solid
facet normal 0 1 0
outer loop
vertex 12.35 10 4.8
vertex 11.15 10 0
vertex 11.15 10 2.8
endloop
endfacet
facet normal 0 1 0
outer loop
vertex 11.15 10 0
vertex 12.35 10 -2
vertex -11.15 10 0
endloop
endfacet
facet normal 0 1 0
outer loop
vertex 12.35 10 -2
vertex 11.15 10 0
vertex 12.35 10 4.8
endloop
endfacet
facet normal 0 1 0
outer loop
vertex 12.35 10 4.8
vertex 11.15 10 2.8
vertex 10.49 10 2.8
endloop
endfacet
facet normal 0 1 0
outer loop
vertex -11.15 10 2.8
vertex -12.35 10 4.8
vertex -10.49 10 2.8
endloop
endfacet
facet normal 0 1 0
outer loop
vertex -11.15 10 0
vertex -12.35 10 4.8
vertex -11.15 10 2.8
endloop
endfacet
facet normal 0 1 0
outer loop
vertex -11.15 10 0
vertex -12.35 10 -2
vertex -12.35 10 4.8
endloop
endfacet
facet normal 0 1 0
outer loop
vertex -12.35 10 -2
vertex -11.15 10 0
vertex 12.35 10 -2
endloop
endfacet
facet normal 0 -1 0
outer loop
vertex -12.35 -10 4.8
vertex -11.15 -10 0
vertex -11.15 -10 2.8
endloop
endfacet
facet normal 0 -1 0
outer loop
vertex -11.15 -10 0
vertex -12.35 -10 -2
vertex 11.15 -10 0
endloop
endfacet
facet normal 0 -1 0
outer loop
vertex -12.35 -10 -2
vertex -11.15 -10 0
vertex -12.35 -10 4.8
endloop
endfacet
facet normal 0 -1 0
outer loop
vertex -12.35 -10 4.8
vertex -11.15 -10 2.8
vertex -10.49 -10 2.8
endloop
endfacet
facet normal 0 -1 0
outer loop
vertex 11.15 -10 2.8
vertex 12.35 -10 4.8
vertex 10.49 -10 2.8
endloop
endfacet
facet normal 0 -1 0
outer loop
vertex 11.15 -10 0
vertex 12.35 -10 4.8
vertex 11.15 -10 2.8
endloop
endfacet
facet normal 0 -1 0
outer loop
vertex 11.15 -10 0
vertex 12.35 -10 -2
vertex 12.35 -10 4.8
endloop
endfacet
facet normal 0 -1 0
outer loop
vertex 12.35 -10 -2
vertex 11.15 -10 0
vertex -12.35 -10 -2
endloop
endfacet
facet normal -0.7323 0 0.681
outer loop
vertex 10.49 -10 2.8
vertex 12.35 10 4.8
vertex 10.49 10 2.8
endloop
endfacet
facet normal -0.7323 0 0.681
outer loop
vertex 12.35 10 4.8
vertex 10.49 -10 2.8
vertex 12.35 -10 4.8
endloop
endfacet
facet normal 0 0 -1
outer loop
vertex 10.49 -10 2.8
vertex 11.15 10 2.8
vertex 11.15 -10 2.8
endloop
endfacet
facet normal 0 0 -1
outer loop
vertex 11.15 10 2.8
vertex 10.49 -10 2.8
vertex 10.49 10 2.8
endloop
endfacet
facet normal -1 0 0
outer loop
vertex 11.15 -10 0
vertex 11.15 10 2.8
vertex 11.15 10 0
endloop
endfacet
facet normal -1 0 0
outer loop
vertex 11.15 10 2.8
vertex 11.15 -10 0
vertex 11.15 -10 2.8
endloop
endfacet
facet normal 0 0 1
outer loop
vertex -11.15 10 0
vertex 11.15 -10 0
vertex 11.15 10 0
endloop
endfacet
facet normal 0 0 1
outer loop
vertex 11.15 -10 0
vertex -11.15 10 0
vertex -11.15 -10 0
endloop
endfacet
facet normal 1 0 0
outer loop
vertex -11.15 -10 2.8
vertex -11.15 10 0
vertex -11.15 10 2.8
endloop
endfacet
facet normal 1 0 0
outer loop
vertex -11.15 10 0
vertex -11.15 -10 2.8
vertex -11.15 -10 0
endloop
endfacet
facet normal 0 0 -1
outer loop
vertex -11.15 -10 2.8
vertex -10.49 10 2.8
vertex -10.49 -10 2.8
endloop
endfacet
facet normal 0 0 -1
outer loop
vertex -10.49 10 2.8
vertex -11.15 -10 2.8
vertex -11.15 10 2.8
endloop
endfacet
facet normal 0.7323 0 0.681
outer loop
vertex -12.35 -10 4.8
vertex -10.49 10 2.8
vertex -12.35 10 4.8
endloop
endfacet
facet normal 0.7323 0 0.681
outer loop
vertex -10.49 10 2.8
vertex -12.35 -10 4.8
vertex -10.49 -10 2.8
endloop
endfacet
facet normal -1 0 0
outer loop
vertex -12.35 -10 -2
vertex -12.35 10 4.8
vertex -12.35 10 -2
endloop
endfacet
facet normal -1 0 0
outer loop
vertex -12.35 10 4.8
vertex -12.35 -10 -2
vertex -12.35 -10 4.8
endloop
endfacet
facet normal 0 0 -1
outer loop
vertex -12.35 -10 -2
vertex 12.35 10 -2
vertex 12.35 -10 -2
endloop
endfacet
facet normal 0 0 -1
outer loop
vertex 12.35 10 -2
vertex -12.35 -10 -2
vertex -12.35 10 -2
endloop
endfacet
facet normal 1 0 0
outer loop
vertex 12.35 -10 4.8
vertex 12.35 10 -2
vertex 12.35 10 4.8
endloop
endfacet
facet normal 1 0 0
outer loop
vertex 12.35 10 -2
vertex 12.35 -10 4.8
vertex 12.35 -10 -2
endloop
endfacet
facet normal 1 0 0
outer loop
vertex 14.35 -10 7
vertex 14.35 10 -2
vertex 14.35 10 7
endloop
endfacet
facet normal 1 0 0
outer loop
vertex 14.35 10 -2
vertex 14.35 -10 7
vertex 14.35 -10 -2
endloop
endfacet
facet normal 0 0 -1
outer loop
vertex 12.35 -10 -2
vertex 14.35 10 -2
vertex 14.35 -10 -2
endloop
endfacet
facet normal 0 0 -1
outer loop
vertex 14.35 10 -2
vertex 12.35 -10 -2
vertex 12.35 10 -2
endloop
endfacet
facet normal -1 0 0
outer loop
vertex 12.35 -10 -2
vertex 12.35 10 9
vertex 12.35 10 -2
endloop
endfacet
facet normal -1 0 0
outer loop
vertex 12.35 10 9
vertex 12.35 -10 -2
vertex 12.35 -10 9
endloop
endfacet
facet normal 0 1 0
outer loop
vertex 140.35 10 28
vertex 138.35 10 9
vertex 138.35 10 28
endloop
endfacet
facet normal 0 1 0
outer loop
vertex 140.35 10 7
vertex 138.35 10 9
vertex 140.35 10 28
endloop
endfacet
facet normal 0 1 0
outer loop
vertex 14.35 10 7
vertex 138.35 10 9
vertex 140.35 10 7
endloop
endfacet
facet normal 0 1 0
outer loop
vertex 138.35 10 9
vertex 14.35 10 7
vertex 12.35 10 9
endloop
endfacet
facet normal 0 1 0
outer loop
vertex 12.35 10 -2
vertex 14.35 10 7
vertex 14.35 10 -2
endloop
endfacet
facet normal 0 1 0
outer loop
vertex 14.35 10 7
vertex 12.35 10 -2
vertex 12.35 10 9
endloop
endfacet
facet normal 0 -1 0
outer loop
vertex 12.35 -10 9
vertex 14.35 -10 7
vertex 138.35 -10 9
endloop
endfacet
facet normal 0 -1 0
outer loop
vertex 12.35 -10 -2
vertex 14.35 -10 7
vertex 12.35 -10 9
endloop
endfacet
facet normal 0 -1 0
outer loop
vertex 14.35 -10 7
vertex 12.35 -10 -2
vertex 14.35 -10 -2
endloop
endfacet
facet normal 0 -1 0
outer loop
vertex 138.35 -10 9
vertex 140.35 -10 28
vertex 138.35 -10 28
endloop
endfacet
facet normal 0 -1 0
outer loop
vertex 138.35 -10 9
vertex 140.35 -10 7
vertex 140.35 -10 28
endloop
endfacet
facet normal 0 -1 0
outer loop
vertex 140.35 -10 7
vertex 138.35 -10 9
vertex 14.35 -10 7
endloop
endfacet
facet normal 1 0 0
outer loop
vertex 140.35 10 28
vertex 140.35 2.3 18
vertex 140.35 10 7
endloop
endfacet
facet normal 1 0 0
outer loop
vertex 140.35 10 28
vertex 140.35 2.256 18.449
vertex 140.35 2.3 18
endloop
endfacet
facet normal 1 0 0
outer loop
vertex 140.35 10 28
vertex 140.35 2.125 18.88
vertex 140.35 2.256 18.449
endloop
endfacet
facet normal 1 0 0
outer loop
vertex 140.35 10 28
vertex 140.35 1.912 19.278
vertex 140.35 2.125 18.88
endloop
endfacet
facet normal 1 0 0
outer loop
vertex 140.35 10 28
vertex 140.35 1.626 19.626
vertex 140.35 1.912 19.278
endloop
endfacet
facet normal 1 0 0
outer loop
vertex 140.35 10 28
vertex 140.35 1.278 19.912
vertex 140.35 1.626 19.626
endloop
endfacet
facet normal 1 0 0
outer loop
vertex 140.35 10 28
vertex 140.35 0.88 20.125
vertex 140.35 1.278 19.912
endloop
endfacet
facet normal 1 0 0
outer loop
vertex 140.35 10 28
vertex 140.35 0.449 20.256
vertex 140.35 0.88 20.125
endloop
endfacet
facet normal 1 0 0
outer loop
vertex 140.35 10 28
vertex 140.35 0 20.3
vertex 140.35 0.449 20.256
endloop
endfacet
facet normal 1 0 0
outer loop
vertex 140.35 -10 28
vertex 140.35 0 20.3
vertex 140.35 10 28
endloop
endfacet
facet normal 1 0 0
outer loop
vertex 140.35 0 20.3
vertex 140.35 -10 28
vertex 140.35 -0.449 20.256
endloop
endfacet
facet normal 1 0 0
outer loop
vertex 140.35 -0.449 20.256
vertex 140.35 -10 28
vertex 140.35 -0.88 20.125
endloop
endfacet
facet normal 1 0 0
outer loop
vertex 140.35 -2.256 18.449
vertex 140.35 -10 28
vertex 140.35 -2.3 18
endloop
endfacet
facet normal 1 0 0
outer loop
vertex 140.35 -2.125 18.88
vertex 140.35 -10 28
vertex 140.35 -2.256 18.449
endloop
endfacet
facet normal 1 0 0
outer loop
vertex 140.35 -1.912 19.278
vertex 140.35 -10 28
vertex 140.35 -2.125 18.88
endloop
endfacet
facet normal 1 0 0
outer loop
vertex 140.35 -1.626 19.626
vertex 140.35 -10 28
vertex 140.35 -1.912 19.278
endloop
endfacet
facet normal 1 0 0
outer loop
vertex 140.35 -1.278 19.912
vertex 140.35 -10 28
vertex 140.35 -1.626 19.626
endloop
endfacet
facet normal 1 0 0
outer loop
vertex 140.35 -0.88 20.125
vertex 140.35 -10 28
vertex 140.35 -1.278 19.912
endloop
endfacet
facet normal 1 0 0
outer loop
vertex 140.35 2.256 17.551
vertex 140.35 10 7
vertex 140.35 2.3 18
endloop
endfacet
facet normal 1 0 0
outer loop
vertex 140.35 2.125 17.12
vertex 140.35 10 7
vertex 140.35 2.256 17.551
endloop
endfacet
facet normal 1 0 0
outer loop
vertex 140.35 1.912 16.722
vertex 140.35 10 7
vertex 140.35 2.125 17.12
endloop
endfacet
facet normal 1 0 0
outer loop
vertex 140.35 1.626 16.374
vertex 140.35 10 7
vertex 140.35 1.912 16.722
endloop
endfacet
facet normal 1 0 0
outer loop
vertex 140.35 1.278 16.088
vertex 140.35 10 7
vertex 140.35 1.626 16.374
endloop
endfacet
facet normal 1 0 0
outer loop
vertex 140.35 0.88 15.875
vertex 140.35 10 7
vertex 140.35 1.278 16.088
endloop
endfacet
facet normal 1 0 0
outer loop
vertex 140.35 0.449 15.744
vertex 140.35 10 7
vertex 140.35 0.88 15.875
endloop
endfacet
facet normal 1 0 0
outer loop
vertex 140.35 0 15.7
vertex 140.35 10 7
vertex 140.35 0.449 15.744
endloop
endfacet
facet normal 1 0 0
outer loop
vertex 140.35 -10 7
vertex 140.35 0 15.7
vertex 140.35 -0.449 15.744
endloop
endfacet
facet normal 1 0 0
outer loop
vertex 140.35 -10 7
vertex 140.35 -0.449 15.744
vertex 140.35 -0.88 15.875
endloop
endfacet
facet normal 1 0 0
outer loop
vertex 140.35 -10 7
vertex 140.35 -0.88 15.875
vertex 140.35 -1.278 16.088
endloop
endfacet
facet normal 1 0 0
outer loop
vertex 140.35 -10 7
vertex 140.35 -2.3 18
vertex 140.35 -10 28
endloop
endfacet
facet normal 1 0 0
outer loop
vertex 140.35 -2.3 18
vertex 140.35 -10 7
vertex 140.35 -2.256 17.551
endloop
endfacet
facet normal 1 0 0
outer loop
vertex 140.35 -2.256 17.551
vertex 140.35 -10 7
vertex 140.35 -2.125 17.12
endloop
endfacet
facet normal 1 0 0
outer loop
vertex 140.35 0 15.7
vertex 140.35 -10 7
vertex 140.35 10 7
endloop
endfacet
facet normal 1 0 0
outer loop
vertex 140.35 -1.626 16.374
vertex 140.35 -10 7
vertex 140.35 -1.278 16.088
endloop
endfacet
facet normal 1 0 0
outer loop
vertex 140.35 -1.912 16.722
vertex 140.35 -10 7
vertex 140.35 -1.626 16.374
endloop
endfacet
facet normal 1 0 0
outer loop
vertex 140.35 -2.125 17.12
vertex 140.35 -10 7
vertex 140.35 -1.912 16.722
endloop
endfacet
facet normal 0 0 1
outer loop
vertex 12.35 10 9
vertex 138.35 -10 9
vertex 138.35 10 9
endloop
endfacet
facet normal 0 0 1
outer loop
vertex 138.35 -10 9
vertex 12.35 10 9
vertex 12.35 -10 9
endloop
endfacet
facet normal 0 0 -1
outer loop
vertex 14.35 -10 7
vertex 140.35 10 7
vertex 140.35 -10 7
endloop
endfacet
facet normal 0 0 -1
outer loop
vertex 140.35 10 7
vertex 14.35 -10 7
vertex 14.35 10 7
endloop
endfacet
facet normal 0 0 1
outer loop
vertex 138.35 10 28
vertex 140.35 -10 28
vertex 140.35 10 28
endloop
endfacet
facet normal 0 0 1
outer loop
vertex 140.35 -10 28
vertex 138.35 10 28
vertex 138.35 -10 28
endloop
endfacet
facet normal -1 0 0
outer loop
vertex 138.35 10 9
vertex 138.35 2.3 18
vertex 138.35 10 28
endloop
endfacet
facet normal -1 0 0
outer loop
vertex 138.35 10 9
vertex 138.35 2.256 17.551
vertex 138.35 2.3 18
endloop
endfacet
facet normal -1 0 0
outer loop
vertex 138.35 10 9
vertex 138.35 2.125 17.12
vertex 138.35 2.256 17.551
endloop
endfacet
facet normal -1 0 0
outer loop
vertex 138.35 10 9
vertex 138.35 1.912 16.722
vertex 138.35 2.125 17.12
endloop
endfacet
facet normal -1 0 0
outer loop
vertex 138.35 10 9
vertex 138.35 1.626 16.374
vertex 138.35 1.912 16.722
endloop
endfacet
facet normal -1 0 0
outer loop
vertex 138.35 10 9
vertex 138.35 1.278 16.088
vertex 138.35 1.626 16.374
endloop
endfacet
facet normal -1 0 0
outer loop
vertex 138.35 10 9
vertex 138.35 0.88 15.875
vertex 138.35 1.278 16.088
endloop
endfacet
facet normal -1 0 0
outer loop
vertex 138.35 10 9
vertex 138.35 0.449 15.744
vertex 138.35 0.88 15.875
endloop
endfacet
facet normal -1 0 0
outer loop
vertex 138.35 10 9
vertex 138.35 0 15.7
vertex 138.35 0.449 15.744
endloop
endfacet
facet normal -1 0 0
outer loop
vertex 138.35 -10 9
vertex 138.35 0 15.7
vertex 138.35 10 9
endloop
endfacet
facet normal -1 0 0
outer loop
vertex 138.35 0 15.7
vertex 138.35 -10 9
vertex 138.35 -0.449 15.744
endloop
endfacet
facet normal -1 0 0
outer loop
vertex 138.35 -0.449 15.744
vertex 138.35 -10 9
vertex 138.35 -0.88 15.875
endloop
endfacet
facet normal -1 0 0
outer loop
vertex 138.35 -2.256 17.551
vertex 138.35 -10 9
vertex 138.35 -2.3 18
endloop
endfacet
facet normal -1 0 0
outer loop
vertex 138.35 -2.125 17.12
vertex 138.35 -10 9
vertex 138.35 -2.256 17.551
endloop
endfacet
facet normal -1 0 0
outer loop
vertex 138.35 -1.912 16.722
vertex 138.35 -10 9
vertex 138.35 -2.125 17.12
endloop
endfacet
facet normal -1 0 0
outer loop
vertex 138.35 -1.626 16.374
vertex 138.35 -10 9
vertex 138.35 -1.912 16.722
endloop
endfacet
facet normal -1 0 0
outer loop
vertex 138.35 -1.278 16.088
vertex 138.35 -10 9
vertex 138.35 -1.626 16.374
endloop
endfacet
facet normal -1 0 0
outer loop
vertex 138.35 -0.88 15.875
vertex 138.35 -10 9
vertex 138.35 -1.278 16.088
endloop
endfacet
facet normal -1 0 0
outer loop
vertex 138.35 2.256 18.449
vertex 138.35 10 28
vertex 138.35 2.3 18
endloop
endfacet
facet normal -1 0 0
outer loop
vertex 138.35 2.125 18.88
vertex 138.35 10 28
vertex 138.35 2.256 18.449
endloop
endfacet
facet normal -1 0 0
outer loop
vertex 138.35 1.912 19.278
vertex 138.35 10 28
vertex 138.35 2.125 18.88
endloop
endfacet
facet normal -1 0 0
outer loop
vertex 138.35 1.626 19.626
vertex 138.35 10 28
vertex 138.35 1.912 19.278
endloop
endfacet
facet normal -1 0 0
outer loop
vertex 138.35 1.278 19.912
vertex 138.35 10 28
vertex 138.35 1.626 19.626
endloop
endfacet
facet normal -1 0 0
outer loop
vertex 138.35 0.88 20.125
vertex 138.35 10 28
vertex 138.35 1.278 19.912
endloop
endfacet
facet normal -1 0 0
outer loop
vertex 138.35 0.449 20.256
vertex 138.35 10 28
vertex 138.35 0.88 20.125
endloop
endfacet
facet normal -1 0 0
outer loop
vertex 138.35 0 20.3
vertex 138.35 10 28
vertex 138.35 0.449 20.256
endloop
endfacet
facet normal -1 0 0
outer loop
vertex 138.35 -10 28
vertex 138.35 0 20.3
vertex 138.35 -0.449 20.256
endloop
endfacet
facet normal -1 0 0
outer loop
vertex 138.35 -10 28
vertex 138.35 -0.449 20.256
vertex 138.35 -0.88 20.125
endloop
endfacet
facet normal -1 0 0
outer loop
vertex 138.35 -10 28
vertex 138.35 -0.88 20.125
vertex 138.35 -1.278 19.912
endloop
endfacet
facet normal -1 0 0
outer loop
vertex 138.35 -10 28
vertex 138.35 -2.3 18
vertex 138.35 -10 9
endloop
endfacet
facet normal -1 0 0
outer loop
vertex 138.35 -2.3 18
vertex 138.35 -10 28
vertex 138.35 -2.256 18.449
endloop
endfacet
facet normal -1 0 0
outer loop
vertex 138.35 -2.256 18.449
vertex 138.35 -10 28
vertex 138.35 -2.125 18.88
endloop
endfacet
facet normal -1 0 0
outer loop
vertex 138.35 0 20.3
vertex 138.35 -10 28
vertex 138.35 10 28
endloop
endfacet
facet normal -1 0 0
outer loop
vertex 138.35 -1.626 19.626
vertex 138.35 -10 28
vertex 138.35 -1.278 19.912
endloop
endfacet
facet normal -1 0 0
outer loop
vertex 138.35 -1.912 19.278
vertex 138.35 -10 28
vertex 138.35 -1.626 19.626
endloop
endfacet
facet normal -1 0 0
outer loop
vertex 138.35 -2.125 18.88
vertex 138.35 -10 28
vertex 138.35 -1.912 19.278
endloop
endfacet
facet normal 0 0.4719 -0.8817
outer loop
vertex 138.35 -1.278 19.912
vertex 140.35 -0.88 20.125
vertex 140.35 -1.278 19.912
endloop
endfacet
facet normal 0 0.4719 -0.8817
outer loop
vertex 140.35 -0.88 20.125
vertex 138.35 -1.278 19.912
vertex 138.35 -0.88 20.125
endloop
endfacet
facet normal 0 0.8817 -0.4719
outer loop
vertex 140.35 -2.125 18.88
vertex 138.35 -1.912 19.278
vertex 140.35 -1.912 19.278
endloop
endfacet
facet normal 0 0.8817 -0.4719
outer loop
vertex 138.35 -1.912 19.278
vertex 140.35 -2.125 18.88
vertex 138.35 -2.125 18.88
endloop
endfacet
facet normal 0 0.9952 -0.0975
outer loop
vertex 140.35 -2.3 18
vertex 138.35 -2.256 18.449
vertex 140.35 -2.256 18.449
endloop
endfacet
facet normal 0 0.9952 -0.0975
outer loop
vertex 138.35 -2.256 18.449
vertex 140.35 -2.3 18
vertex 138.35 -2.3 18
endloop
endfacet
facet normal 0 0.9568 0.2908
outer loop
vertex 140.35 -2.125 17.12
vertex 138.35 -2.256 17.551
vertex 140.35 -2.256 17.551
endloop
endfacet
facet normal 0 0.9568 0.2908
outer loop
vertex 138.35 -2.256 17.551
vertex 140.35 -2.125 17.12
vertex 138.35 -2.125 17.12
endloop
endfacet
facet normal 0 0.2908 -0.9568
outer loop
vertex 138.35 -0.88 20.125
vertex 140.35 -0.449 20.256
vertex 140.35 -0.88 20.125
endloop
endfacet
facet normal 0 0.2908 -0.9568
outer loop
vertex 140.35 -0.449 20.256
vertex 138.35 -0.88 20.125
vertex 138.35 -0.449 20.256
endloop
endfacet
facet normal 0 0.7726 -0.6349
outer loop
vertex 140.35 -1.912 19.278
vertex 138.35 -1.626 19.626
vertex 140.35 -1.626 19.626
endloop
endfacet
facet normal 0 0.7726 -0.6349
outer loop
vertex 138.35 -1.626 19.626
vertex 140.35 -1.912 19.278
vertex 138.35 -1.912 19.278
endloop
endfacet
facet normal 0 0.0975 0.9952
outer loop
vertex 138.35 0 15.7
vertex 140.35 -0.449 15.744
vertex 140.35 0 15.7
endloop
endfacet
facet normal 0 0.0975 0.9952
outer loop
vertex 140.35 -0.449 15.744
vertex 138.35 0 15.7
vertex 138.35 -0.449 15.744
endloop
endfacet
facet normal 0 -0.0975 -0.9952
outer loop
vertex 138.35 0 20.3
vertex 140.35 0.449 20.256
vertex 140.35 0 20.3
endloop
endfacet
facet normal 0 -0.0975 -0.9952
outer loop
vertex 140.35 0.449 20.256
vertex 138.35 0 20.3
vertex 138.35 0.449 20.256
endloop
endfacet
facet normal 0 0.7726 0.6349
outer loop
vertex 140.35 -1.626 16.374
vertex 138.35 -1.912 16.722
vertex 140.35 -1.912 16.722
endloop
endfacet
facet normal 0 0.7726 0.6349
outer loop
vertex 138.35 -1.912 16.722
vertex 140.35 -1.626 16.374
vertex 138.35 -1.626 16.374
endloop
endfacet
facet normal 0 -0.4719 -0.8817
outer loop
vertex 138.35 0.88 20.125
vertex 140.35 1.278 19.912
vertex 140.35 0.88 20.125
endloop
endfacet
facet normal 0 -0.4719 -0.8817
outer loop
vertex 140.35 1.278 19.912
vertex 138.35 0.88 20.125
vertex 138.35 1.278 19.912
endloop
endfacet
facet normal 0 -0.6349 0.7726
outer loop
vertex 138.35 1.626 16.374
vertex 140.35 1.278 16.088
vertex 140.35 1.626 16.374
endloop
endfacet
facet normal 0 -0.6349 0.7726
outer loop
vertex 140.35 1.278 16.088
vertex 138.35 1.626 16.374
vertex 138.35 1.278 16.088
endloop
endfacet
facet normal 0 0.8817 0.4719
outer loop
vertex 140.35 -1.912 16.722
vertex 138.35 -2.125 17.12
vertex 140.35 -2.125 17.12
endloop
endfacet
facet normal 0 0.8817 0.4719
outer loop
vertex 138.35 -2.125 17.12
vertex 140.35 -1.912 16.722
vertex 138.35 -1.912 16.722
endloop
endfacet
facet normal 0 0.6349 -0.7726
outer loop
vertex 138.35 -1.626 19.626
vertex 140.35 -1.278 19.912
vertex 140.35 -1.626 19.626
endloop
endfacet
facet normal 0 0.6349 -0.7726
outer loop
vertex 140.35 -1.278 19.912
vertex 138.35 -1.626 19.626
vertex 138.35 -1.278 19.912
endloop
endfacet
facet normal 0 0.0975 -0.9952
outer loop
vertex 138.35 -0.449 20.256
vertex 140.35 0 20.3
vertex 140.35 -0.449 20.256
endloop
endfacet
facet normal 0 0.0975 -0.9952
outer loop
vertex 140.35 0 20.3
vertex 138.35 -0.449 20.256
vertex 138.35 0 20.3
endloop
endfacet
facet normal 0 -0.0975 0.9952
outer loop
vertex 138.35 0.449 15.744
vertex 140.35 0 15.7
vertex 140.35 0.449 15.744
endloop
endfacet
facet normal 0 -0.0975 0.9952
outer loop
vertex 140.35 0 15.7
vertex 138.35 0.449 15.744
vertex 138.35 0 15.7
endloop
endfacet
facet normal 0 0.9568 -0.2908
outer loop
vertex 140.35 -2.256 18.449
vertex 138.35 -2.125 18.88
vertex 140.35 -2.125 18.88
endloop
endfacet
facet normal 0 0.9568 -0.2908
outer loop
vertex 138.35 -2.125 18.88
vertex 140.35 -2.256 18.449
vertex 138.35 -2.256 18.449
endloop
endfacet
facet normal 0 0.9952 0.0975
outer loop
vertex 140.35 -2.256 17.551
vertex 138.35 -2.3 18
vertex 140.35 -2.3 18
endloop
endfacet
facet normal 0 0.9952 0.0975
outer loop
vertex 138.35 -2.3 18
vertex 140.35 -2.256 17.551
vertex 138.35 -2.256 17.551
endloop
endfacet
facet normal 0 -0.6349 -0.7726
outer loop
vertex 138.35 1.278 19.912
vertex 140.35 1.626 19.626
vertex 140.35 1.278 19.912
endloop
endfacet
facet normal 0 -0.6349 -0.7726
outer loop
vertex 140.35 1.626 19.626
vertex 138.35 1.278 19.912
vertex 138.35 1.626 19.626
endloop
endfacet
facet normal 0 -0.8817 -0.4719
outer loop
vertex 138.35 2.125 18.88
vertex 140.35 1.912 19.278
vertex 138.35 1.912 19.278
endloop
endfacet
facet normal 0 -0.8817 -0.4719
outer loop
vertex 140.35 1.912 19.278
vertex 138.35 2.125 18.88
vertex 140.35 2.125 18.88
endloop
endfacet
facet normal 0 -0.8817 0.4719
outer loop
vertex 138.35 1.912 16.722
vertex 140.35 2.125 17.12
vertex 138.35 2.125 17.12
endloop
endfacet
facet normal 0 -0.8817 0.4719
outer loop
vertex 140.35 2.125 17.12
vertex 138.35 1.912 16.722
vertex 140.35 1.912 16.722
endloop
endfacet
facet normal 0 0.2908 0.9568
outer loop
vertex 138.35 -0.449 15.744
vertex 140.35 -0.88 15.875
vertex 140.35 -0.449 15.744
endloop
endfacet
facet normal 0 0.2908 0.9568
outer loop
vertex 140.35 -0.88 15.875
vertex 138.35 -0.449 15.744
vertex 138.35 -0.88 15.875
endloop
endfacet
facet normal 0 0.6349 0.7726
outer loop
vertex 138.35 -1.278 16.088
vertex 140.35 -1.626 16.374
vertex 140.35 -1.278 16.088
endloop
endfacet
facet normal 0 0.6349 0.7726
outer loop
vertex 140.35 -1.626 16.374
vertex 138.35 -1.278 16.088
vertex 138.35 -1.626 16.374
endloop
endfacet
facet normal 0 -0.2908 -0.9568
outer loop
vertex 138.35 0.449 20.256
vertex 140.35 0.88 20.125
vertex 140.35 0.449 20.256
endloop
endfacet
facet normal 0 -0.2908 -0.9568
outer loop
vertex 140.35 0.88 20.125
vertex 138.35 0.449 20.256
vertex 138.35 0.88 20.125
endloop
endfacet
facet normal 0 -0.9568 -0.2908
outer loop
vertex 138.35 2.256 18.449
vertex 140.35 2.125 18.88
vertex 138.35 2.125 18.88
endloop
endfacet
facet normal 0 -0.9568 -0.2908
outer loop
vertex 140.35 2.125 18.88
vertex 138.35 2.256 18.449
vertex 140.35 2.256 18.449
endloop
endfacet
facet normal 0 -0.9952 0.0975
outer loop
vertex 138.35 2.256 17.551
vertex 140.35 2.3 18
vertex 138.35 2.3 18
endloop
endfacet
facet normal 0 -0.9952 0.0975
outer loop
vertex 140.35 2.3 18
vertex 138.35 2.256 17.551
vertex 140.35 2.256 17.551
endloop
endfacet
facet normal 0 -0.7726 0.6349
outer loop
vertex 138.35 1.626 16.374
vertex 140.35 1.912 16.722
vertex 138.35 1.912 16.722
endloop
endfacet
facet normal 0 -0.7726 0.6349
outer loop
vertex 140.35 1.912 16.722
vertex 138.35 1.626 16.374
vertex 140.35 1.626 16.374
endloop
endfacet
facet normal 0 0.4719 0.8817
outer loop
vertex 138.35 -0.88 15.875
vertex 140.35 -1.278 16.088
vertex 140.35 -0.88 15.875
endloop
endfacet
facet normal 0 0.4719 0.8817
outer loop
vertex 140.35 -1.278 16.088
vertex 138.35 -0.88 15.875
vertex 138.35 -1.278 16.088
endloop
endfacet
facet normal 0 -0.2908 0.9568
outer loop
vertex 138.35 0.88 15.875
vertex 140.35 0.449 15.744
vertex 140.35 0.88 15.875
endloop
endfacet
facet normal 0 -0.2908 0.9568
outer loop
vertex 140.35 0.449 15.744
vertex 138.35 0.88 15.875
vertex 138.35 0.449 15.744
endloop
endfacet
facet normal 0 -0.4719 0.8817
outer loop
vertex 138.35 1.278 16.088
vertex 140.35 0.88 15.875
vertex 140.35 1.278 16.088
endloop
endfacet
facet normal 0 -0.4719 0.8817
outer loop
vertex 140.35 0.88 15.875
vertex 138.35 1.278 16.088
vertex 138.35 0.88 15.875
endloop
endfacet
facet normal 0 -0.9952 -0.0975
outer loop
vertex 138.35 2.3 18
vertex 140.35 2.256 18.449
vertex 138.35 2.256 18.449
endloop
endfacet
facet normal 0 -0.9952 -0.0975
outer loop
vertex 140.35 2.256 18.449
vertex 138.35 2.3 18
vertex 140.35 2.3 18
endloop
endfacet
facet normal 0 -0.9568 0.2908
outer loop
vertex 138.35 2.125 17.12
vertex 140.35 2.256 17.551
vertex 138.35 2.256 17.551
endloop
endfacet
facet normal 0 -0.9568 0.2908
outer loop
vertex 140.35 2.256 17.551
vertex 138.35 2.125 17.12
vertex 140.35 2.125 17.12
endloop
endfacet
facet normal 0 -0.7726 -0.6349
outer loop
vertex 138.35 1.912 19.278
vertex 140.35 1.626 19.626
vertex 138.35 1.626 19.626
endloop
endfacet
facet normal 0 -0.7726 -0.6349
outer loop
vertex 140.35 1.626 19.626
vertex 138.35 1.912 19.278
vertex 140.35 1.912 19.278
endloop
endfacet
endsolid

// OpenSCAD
$fn=32;
width = 20;
channel_width = 22.3;
latch_height = 2;
overhang = 0.66;
wall_thickness = 2.8;
thickness = 2;
screw_hole_radius = 2.3;
screw_hole_width = 0;
channel_depth = 16;
hook_length = 128;

outer_x = channel_width/2 + 1.2;

difference() {    
union() {
  rotate([90,0,0])
  translate([0, 0, -width/2])
  linear_extrude(width)
  polygon([
    [-outer_x, -thickness],
    [-outer_x, wall_thickness + latch_height],
    [-channel_width/2 + overhang, wall_thickness],
    [-channel_width/2, wall_thickness],
    [-channel_width/2, 0],
    [channel_width/2, 0],
    [channel_width/2, wall_thickness],
    [channel_width/2 - overhang, wall_thickness],
    [outer_x, wall_thickness + latch_height],
    [outer_x, -thickness],
  ]);
  
  translate([outer_x, -width/2, -thickness])
  cube([thickness, width, channel_depth/2 + thickness]);
    
  translate([outer_x, -width/2, channel_depth/2 - thickness/2])
  cube([hook_length, width, thickness]);
  
  translate([outer_x + hook_length-thickness, -width/2, channel_depth/2])
  cube([thickness, width, width]);
}
  translate([outer_x + hook_length-thickness, 0, (channel_depth+width)/2])
  rotate([0,90,0])
  translate([0, 0, -1])
  hull() {
    translate([screw_hole_width/2, 0, 0])
    cylinder(h=thickness+2, r=screw_hole_radius);
    translate([-screw_hole_width/2, 0, 0])
    cylinder(h=thickness+2, r=screw_hole_radius);
  }
}
